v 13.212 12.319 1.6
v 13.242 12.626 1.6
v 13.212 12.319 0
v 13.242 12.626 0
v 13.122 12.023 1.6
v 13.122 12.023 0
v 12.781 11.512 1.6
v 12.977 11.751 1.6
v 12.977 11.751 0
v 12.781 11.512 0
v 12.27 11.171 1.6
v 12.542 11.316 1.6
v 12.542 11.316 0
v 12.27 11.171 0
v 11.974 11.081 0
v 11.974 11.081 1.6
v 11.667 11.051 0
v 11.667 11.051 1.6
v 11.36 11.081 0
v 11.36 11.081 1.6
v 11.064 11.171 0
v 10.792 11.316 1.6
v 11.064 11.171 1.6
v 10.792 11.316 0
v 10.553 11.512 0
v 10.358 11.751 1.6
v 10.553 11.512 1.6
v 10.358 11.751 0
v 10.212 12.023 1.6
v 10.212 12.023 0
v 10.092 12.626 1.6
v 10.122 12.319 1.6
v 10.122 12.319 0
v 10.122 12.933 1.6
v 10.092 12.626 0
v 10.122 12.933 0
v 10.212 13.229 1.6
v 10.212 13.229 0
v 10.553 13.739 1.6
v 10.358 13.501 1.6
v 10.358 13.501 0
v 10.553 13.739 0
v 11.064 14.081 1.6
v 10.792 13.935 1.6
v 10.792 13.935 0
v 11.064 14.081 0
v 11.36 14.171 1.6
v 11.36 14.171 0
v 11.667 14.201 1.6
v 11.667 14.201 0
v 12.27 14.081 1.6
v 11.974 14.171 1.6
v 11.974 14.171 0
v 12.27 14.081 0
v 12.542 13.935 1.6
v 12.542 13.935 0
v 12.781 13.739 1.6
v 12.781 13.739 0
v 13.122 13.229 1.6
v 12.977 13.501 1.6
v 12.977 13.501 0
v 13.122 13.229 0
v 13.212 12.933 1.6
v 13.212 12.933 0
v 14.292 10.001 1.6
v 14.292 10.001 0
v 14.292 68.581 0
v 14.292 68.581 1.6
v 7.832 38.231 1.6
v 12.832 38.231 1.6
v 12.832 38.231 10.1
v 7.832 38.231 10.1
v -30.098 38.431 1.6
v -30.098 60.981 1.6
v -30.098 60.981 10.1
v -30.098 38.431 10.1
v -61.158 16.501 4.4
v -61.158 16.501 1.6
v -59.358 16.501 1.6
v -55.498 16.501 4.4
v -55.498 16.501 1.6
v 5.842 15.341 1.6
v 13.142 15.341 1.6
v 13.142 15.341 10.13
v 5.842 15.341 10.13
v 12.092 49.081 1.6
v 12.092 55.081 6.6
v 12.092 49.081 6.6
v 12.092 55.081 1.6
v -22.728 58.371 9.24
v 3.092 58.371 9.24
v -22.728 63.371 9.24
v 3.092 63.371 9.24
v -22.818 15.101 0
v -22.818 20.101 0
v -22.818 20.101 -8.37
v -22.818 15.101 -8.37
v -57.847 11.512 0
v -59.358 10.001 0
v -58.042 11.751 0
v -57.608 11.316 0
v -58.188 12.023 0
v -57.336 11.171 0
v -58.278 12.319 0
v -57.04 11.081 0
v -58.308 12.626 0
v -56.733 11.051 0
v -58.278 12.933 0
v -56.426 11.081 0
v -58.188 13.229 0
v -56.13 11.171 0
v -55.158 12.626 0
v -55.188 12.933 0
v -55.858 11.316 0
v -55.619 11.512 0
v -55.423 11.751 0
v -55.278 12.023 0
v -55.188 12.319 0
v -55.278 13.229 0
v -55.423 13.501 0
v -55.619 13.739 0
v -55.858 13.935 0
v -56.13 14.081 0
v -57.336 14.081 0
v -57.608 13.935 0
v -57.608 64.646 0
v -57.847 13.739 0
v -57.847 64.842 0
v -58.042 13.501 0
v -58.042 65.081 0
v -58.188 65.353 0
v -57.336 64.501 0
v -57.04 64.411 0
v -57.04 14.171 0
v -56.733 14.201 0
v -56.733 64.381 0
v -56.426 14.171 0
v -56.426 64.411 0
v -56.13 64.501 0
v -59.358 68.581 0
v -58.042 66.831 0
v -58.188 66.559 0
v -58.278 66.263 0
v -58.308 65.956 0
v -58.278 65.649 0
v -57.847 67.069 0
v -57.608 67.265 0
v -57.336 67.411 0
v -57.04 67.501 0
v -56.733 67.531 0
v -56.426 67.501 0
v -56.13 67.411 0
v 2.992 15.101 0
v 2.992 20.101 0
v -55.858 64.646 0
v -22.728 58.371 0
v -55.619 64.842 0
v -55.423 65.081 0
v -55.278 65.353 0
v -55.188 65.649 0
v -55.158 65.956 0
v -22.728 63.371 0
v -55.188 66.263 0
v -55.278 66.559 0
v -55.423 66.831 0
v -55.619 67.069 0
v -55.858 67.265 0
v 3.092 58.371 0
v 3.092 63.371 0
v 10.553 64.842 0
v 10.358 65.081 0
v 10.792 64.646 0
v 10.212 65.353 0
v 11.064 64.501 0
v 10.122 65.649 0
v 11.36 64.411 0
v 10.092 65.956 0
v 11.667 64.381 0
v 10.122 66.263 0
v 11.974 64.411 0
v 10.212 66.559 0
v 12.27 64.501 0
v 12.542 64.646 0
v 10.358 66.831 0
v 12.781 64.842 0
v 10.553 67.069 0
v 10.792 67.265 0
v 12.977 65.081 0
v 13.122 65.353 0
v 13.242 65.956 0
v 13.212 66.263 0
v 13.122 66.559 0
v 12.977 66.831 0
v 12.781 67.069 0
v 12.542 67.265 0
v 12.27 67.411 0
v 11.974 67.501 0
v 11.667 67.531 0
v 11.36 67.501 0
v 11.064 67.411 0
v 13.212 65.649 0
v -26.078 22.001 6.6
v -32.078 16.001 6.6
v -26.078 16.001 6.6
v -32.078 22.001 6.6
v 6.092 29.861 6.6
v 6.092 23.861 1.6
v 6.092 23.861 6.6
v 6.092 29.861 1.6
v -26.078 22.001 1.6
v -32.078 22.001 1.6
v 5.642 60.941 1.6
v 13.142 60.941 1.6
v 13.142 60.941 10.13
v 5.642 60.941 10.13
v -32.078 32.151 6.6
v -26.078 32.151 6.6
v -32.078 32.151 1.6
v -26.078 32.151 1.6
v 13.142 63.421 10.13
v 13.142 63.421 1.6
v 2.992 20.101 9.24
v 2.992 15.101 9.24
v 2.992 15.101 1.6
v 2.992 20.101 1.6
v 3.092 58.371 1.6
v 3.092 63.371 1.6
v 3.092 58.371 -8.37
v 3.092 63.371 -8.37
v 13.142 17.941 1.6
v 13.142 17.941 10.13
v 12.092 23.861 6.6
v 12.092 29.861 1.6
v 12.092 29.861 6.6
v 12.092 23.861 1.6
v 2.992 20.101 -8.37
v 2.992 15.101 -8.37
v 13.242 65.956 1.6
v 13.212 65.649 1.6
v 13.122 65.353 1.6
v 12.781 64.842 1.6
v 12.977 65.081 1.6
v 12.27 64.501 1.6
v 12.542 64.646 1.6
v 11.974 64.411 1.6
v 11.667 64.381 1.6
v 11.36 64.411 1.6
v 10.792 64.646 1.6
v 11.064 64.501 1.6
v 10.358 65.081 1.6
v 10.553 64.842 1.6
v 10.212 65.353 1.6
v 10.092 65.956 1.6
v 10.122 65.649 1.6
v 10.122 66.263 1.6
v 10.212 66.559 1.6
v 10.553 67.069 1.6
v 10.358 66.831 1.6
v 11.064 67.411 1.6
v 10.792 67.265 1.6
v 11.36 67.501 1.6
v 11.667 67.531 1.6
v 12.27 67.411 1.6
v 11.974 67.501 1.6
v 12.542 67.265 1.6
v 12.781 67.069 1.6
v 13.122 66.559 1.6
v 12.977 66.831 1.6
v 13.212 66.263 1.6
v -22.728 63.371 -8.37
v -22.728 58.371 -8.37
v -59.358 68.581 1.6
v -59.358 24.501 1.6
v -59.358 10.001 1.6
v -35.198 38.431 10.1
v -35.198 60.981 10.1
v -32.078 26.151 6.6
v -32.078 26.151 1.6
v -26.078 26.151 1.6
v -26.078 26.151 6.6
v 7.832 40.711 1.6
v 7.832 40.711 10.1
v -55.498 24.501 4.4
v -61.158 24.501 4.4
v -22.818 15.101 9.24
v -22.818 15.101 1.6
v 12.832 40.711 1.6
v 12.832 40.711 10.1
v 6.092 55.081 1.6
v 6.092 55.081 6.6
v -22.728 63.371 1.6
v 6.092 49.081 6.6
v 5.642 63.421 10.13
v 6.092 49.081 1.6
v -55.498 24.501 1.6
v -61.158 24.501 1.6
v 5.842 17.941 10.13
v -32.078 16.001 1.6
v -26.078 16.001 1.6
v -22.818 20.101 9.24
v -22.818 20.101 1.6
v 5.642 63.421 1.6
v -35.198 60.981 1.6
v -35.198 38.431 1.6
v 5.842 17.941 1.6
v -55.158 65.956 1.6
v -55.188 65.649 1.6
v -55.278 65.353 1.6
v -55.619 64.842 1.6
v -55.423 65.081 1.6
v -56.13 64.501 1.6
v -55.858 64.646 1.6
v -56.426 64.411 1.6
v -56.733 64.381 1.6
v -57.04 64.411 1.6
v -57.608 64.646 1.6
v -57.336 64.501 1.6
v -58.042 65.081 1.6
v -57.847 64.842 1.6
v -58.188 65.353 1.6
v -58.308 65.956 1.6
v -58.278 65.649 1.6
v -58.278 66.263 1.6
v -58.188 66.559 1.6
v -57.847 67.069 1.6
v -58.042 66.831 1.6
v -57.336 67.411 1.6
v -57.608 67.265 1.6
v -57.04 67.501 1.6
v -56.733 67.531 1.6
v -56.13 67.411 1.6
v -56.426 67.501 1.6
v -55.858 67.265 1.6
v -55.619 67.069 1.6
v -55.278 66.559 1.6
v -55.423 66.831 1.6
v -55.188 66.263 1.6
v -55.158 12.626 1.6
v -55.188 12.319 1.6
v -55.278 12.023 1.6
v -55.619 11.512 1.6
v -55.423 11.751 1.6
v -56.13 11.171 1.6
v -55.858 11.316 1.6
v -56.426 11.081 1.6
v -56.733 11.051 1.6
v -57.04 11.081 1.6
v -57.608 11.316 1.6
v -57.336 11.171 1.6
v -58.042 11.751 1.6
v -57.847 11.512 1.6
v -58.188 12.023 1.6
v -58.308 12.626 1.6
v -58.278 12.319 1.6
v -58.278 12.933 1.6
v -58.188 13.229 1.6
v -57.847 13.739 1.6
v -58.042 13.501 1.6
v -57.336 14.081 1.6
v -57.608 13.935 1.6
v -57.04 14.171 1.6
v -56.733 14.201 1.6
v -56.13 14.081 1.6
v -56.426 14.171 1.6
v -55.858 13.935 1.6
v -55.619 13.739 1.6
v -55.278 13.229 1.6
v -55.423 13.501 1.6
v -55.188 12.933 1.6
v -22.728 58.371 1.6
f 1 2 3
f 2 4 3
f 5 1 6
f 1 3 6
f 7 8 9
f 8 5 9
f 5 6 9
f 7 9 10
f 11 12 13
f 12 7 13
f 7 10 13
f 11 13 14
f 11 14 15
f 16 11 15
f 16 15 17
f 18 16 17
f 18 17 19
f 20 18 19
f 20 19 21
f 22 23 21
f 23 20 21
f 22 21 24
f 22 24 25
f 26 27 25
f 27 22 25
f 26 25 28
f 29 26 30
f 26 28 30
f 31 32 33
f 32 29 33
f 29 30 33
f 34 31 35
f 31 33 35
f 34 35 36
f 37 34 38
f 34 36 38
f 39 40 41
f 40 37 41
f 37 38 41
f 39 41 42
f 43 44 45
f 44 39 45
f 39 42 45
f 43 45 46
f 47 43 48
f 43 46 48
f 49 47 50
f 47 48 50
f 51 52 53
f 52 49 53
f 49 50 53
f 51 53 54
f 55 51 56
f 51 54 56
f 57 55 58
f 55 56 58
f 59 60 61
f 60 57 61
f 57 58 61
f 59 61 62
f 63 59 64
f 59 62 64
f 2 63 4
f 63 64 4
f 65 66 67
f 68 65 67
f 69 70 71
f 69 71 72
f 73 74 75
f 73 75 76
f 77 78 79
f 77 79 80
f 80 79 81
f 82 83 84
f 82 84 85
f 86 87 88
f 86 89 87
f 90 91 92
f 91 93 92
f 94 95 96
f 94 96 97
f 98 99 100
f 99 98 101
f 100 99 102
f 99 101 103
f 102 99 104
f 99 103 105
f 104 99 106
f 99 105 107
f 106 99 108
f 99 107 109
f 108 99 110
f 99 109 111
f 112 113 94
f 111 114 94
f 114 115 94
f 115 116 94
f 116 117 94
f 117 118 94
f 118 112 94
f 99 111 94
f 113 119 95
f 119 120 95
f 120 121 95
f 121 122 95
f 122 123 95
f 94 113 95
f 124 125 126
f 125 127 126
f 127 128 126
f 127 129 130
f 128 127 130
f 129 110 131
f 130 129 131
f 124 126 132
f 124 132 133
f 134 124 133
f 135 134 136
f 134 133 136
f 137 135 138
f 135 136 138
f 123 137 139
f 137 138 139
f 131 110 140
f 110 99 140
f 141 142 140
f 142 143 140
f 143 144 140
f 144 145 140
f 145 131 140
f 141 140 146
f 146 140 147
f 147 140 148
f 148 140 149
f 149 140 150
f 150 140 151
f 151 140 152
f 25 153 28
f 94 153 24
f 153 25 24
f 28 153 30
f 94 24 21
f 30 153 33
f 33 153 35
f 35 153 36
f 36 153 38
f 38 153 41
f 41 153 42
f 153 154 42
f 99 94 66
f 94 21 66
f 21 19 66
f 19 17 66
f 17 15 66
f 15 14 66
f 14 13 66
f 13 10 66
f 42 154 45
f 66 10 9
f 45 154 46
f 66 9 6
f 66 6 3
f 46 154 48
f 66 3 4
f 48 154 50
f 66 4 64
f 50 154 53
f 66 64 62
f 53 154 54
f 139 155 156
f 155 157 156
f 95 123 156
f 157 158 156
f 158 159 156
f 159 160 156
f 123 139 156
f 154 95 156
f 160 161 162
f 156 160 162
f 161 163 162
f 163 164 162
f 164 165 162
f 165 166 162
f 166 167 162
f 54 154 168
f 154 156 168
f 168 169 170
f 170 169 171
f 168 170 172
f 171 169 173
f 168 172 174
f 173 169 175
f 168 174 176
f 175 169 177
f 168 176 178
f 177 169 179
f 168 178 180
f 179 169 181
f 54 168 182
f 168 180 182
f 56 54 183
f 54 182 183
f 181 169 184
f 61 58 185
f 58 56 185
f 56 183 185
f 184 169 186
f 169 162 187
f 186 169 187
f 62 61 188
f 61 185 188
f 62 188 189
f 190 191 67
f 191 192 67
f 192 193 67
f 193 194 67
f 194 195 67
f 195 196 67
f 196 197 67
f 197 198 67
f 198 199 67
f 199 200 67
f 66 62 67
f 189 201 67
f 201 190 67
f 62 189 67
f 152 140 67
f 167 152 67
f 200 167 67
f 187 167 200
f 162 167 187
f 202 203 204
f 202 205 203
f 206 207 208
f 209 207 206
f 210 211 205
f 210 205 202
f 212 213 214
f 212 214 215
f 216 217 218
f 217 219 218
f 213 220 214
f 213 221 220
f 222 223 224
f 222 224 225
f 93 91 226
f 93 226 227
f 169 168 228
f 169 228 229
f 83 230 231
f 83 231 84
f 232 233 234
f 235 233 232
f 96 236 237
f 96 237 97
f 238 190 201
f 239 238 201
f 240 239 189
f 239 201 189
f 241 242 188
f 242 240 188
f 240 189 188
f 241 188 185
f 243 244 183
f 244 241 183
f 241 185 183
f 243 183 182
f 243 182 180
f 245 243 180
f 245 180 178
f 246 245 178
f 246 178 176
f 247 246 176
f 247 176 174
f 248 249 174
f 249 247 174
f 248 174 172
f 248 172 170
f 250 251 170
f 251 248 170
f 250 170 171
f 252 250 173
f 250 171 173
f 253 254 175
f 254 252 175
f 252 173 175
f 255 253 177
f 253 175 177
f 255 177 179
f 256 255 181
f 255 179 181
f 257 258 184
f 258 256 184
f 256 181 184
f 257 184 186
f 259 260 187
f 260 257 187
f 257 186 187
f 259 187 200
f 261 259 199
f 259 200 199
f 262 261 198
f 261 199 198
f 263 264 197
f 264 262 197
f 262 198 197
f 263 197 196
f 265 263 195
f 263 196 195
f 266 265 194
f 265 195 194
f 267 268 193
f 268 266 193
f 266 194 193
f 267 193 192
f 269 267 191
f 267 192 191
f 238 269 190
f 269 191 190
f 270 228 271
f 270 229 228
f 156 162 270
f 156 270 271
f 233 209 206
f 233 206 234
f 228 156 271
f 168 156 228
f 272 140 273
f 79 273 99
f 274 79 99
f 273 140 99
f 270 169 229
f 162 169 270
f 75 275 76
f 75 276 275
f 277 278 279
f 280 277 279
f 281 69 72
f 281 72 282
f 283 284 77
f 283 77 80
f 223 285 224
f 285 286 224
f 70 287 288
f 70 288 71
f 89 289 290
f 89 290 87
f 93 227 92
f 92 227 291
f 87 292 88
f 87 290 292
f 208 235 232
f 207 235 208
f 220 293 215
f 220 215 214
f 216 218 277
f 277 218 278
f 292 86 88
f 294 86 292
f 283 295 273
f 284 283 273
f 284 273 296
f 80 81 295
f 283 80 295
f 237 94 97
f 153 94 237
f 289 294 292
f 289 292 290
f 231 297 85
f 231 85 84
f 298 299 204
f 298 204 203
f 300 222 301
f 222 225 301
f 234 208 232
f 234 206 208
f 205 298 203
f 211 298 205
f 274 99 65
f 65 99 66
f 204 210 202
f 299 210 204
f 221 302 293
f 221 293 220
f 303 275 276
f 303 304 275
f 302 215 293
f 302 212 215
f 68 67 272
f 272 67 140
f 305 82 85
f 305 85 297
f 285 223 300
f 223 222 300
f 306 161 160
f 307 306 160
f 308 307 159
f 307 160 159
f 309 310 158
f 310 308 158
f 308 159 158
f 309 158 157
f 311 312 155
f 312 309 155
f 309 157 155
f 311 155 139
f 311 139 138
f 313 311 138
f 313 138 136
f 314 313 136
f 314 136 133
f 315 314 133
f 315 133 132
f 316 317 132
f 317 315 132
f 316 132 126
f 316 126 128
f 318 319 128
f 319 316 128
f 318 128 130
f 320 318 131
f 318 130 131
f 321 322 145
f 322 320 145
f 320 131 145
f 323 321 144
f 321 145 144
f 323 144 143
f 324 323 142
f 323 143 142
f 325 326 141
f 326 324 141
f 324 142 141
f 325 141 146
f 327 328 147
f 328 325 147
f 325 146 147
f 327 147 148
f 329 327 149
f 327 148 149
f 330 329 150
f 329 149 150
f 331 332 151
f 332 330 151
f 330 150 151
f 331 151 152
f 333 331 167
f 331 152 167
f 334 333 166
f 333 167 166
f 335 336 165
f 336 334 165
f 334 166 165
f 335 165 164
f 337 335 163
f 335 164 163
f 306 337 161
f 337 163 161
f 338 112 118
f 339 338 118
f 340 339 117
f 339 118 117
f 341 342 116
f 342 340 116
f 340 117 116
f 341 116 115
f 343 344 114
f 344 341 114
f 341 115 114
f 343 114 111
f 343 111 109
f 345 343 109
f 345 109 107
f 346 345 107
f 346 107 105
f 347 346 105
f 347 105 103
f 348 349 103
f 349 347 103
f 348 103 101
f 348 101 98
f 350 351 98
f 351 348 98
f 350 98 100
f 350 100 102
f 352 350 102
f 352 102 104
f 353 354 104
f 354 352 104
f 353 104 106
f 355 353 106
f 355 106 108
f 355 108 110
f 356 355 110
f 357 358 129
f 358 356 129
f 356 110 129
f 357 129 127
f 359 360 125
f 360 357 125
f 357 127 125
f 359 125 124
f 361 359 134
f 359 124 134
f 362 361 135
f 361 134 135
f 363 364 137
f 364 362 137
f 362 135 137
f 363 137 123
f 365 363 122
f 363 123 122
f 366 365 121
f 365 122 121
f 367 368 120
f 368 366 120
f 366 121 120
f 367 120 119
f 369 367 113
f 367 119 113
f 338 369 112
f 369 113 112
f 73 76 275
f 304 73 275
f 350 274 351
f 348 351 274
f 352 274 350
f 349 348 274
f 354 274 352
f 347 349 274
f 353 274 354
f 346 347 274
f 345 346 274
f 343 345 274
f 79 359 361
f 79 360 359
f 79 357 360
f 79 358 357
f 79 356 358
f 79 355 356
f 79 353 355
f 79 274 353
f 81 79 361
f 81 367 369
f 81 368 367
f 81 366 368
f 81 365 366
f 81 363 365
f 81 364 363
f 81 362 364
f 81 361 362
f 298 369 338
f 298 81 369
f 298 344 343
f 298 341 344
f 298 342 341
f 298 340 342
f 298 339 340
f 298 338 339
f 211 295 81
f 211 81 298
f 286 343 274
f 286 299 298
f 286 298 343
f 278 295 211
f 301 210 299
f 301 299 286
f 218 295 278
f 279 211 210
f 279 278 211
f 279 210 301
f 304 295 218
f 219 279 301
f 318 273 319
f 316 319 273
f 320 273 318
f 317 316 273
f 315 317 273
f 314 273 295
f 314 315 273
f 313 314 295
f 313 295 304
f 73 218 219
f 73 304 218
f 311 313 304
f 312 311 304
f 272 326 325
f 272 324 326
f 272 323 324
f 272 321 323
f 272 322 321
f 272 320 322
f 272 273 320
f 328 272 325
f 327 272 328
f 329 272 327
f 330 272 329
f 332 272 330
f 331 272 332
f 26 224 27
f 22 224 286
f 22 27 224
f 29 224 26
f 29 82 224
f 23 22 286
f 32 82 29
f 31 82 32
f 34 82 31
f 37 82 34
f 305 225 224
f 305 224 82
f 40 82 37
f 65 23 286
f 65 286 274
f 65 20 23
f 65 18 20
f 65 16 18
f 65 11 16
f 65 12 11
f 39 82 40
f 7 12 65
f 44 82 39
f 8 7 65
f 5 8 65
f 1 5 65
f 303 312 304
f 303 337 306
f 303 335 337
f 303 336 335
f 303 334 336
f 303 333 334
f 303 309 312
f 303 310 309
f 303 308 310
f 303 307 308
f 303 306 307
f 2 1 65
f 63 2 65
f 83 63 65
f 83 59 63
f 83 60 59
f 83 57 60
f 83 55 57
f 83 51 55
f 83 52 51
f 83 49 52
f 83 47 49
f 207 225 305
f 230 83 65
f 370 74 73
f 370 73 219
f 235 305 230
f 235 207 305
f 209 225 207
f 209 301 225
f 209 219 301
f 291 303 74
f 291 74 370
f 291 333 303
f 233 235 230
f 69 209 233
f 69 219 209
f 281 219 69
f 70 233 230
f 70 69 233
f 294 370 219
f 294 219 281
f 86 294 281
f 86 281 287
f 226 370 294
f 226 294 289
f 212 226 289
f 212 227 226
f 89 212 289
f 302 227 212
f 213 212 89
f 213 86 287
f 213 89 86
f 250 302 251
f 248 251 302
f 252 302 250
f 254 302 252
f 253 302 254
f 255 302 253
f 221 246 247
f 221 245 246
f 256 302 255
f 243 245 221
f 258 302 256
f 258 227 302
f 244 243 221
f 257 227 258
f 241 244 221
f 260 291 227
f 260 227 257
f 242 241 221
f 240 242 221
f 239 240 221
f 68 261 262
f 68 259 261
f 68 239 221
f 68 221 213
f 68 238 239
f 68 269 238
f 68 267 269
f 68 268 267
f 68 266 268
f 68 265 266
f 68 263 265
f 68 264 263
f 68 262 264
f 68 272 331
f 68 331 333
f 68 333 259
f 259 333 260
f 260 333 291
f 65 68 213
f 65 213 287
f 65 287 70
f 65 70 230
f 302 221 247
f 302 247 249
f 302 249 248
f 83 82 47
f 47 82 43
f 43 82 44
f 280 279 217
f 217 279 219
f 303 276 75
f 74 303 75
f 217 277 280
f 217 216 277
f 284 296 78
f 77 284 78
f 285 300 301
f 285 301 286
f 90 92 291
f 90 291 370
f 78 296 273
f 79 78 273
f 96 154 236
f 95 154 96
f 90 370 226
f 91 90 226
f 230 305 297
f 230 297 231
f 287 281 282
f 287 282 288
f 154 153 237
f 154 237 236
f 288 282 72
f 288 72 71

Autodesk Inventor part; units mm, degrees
ref_plane "YZ Plane" through (0, 0, 0) normal (1, 0, 0) x (0, 1, 0)
ref_plane "XZ Plane" through (0, 0, 0) normal (0, 1, 0) x (-1, 0, 0)
ref_plane "XY Plane" through (0, 0, 0) normal (0, 0, 1) x (1, 0, 0)
sketch "card" plane through (0, 0, 0) normal (0, 0, 1) x (1, 0, 0)
  line L0 (-59.3579, 68.5808) -> (-59.3579, 10.0008)
  line L1 (-59.3579, 10.0008) -> (14.2921, 10.0008)
  line L2 (14.2921, 10.0008) -> (14.2921, 68.5808)
  line L3 (14.2921, 68.5808) -> (-59.3579, 68.5808)
  circle A0 centre (11.6671, 65.9558) radius 1.575
  circle A1 centre (11.6671, 12.6258) radius 1.575
  circle A2 centre (-56.7329, 65.9558) radius 1.575
  circle A3 centre (-56.7329, 12.6258) radius 1.575
  point P0 (0, 0)
  dimension "d1" = 58.58
  dimension "d2" = 73.65
  dimension "d4" = 2.625
  dimension "d5" = 3.15
extrude "main_board" add sketch "card" along normal blind 1.6
sketch "back_components" plane through (0, 0, 0) normal (0, 0, -1) x (-1, 0, 0)
  line L0 (-3.0921, 63.3708) -> (22.7279, 63.3708)
  line L1 (22.7279, 63.3708) -> (22.7279, 58.3708)
  line L2 (22.7279, 58.3708) -> (-3.0921, 58.3708)
  line L3 (-3.0921, 58.3708) -> (-3.0921, 63.3708)
  line L4 (-2.9921, 20.1008) -> (22.8179, 20.1008)
  line L5 (22.8179, 20.1008) -> (22.8179, 15.1008)
  line L6 (22.8179, 15.1008) -> (-2.9921, 15.1008)
  line L7 (-2.9921, 15.1008) -> (-2.9921, 20.1008)
  line L8 (-14.2921, 68.5808) -> (59.3579, 68.5808) projected
  line L9 (-14.2921, 10.0008) -> (-14.2921, 68.5808) projected
  line L10 (59.3579, 10.0008) -> (-14.2921, 10.0008) projected
  point P0 (0, 0)
  dimension "d23" = 5.21
  dimension "d24" = 11.2
  dimension "d25" = 5.1
  dimension "d26" = 11.3
  dimension "d27" = 5
  dimension "d28" = 5
  dimension "d29" = 25.82
  dimension "d30" = 25.81
extrude "pins_female" add sketch "back_components" along normal blind 8.37
extrude "pins_male1" add sketch "back_components" against normal blind 9.24 contours L0 L1 L2 L3
extrude "pins_male2" add sketch "back_components" against normal blind 9.24
sketch "front_components" plane through (0, 0, 1.6) normal (0, 0, 1) x (1, 0, 0)
  line L0 (-55.4979, 24.5008) -> (-61.1579, 24.5008)
  line L1 (-61.1579, 24.5008) -> (-61.1579, 16.5008)
  line L2 (-61.1579, 16.5008) -> (-55.4979, 16.5008)
  line L3 (-55.4979, 16.5008) -> (-55.4979, 24.5008)
  line L4 (-59.3579, 10.0008) -> (14.2921, 10.0008) projected
  line L5 (-59.3579, 68.5808) -> (-59.3579, 10.0008) projected
  line L6 (-35.1979, 60.9808) -> (-30.0979, 60.9808)
  line L7 (-30.0979, 60.9808) -> (-30.0979, 38.4308)
  line L8 (-30.0979, 38.4308) -> (-35.1979, 38.4308)
  line L9 (-35.1979, 38.4308) -> (-35.1979, 60.9808)
  line L10 (-32.0779, 22.0008) -> (-26.0779, 22.0008)
  line L11 (-26.0779, 22.0008) -> (-26.0779, 16.0008)
  line L12 (-26.0779, 16.0008) -> (-32.0779, 16.0008)
  line L13 (-32.0779, 16.0008) -> (-32.0779, 22.0008)
  line L14 (-22, 22) -> (-2, 22)
  line L15 (-2, 22) -> (-2, 16)
  line L16 (-2, 16) -> (-22, 16)
  line L17 (-22, 16) -> (-22, 22)
  line L18 (5.8421, 17.9408) -> (13.1421, 17.9408)
  line L19 (13.1421, 17.9408) -> (13.1421, 15.3408)
  line L20 (13.1421, 15.3408) -> (5.8421, 15.3408)
  line L21 (5.8421, 15.3408) -> (5.8421, 17.9408)
  line L22 (6.0921, 29.8608) -> (12.0921, 29.8608)
  line L23 (12.0921, 29.8608) -> (12.0921, 23.8608)
  line L24 (12.0921, 23.8608) -> (6.0921, 23.8608)
  line L25 (6.0921, 23.8608) -> (6.0921, 29.8608)
  line L26 (7.8321, 40.7108) -> (12.8321, 40.7108)
  line L27 (12.8321, 40.7108) -> (12.8321, 38.2308)
  line L28 (12.8321, 38.2308) -> (7.8321, 38.2308)
  line L29 (7.8321, 38.2308) -> (7.8321, 40.7108)
  line L30 (6.0921, 55.0808) -> (12.0921, 55.0808)
  line L31 (12.0921, 55.0808) -> (12.0921, 49.0808)
  line L32 (12.0921, 49.0808) -> (6.0921, 49.0808)
  line L33 (6.0921, 49.0808) -> (6.0921, 55.0808)
  line L34 (5.6421, 63.4208) -> (13.1421, 63.4208)
  line L35 (13.1421, 63.4208) -> (13.1421, 60.9408)
  line L36 (13.1421, 60.9408) -> (5.6421, 60.9408)
  line L37 (5.6421, 60.9408) -> (5.6421, 63.4208)
  line L38 (-27, 66) -> (-6, 66)
  line L39 (-6, 66) -> (-6, 62)
  line L40 (-6, 62) -> (-27, 62)
  line L41 (-27, 62) -> (-27, 66)
  line L42 (-32.0779, 26.1508) -> (-26.0779, 26.1508)
  line L43 (-26.0779, 26.1508) -> (-26.0779, 32.1508)
  line L44 (-26.0779, 32.1508) -> (-32.0779, 32.1508)
  line L45 (-32.0779, 32.1508) -> (-32.0779, 26.1508)
  line L46 (14.2921, 68.5808) -> (-59.3579, 68.5808) projected
  line L47 (14.2921, 10.0008) -> (14.2921, 68.5808) projected
  point P0 (0, 0)
  dimension "d19" = 6.5
  dimension "d20" = 8
  dimension "d21" = 1.8
  dimension "d22" = 5.66
  dimension "d31" = 27.28
  dimension "d32" = 6
  dimension "d33" = 6
  dimension "d34" = 6
  dimension "d35" = 4.15
  dimension "d36" = 6
  dimension "d37" = 6
  dimension "d38" = 5.16
  dimension "d39" = 2.48
  dimension "d40" = 5.86
  dimension "d41" = 6
  dimension "d42" = 6
  dimension "d43" = 8.37
  dimension "d44" = 2.48
  dimension "d45" = 7.5
  dimension "d46" = 6
  dimension "d47" = 6
  dimension "d48" = 8.37
  dimension "d49" = 5.92
  dimension "d50" = 2.6
  dimension "d51" = 1.15
  dimension "d58" = 7.6
  dimension "d59" = 22.55
  dimension "d60" = 5.1
  dimension "d61" = 24.16
  dimension "d62" = 2.2
  dimension "d63" = 1.46
  dimension "d64" = 5
  dimension "d65" = 7.3
  dimension "d66" = 1.15
extrude "vcc_gnd" add sketch "front_components" along normal blind 8.53 contours L18 L19 L20 L21 | L34 L35 L36 L37
extrude "buttons" add sketch "front_components" along normal blind 5 contours L10 L11 L12 L13 | L22 L23 L24 L25 | L30 L31 L32 L33 | L45 L44 L43 L42
extrude "sikring" add sketch "front_components" along normal blind 8.5 contours L6 L7 L8 L9 | L26 L27 L28 L29
extrude "micro_USB" add sketch "front_components" along normal blind 2.8 contours L3 L2 L5 L0 | L5 L2 L1 L0
properties part number "lunchpad"
